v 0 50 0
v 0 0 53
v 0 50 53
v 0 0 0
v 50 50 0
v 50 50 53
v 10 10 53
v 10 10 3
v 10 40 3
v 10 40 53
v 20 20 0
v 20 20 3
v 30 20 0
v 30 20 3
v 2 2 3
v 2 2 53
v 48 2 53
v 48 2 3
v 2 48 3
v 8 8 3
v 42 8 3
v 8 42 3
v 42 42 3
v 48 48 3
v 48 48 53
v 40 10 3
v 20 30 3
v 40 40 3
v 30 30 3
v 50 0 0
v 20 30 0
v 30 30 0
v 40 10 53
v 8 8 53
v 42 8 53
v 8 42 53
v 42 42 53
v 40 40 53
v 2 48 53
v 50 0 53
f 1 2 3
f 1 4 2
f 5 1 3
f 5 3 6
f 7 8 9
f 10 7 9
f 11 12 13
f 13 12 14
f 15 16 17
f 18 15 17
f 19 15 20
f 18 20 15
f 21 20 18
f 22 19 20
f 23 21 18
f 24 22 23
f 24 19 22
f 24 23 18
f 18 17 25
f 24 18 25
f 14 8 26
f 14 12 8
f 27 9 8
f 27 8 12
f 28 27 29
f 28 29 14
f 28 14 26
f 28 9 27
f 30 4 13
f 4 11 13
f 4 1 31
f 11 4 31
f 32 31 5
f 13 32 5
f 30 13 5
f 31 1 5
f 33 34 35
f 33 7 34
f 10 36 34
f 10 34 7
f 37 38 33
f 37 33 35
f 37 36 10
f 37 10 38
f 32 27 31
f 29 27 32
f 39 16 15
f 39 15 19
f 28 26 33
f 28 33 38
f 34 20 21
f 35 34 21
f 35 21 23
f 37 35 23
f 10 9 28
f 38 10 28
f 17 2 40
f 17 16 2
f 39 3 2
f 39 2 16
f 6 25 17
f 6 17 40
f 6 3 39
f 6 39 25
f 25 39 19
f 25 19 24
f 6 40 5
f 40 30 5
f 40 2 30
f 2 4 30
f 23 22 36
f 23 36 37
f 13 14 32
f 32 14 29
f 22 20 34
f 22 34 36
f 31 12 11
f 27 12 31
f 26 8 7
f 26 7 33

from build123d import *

# Parameters (mm, degrees)
SKETCH_W      = 50
SKETCH_H      = 50
PAD_DEPTH     = 3
SKETCH001_W   = 10
SKETCH001_H   = 10
POCKET_DEPTH  = 5
SKETCH002_W   = 50
SKETCH002_H   = 50
SKETCH002_W_2 = 46
SKETCH002_H_2 = 46
PAD001_DEPTH  = 50
SKETCH003_W   = 34
SKETCH003_H   = 34
SKETCH003_W_2 = 30
SKETCH003_H_2 = 30
PAD002_DEPTH  = 50


with BuildPart() as part:
    # Sketch → Pad (new body)
    with BuildSketch(Plane.XY):
        with Locations((25, 25)):
            Rectangle(SKETCH_W, SKETCH_H)
    extrude(amount=PAD_DEPTH)

    # Sketch001 (on Face6 of Pad) → Pocket (cut)
    with BuildSketch(Plane.XY.offset(3)):
        with Locations((25, 25)):
            Rectangle(SKETCH001_W, SKETCH001_H)
    extrude(amount=-POCKET_DEPTH, mode=Mode.SUBTRACT)

    # Sketch002 (on Face5 of Pocket) → Pad001 (join)
    with BuildSketch(Plane.XY.offset(3)):
        with Locations((25, 25)):
            Rectangle(SKETCH002_W, SKETCH002_H)
        with Locations((25, 25)):
            Rectangle(SKETCH002_W_2, SKETCH002_H_2, mode=Mode.SUBTRACT)
    extrude(amount=PAD001_DEPTH)

    # Sketch003 (on Face15 of Pad001) → Pad002 (join)
    with BuildSketch(Plane.XY.offset(3)):
        with Locations((25, 25)):
            Rectangle(SKETCH003_W, SKETCH003_H)
        with Locations((25, 25)):
            Rectangle(SKETCH003_W_2, SKETCH003_H_2, mode=Mode.SUBTRACT)
    extrude(amount=PAD002_DEPTH)


solid = part.part
